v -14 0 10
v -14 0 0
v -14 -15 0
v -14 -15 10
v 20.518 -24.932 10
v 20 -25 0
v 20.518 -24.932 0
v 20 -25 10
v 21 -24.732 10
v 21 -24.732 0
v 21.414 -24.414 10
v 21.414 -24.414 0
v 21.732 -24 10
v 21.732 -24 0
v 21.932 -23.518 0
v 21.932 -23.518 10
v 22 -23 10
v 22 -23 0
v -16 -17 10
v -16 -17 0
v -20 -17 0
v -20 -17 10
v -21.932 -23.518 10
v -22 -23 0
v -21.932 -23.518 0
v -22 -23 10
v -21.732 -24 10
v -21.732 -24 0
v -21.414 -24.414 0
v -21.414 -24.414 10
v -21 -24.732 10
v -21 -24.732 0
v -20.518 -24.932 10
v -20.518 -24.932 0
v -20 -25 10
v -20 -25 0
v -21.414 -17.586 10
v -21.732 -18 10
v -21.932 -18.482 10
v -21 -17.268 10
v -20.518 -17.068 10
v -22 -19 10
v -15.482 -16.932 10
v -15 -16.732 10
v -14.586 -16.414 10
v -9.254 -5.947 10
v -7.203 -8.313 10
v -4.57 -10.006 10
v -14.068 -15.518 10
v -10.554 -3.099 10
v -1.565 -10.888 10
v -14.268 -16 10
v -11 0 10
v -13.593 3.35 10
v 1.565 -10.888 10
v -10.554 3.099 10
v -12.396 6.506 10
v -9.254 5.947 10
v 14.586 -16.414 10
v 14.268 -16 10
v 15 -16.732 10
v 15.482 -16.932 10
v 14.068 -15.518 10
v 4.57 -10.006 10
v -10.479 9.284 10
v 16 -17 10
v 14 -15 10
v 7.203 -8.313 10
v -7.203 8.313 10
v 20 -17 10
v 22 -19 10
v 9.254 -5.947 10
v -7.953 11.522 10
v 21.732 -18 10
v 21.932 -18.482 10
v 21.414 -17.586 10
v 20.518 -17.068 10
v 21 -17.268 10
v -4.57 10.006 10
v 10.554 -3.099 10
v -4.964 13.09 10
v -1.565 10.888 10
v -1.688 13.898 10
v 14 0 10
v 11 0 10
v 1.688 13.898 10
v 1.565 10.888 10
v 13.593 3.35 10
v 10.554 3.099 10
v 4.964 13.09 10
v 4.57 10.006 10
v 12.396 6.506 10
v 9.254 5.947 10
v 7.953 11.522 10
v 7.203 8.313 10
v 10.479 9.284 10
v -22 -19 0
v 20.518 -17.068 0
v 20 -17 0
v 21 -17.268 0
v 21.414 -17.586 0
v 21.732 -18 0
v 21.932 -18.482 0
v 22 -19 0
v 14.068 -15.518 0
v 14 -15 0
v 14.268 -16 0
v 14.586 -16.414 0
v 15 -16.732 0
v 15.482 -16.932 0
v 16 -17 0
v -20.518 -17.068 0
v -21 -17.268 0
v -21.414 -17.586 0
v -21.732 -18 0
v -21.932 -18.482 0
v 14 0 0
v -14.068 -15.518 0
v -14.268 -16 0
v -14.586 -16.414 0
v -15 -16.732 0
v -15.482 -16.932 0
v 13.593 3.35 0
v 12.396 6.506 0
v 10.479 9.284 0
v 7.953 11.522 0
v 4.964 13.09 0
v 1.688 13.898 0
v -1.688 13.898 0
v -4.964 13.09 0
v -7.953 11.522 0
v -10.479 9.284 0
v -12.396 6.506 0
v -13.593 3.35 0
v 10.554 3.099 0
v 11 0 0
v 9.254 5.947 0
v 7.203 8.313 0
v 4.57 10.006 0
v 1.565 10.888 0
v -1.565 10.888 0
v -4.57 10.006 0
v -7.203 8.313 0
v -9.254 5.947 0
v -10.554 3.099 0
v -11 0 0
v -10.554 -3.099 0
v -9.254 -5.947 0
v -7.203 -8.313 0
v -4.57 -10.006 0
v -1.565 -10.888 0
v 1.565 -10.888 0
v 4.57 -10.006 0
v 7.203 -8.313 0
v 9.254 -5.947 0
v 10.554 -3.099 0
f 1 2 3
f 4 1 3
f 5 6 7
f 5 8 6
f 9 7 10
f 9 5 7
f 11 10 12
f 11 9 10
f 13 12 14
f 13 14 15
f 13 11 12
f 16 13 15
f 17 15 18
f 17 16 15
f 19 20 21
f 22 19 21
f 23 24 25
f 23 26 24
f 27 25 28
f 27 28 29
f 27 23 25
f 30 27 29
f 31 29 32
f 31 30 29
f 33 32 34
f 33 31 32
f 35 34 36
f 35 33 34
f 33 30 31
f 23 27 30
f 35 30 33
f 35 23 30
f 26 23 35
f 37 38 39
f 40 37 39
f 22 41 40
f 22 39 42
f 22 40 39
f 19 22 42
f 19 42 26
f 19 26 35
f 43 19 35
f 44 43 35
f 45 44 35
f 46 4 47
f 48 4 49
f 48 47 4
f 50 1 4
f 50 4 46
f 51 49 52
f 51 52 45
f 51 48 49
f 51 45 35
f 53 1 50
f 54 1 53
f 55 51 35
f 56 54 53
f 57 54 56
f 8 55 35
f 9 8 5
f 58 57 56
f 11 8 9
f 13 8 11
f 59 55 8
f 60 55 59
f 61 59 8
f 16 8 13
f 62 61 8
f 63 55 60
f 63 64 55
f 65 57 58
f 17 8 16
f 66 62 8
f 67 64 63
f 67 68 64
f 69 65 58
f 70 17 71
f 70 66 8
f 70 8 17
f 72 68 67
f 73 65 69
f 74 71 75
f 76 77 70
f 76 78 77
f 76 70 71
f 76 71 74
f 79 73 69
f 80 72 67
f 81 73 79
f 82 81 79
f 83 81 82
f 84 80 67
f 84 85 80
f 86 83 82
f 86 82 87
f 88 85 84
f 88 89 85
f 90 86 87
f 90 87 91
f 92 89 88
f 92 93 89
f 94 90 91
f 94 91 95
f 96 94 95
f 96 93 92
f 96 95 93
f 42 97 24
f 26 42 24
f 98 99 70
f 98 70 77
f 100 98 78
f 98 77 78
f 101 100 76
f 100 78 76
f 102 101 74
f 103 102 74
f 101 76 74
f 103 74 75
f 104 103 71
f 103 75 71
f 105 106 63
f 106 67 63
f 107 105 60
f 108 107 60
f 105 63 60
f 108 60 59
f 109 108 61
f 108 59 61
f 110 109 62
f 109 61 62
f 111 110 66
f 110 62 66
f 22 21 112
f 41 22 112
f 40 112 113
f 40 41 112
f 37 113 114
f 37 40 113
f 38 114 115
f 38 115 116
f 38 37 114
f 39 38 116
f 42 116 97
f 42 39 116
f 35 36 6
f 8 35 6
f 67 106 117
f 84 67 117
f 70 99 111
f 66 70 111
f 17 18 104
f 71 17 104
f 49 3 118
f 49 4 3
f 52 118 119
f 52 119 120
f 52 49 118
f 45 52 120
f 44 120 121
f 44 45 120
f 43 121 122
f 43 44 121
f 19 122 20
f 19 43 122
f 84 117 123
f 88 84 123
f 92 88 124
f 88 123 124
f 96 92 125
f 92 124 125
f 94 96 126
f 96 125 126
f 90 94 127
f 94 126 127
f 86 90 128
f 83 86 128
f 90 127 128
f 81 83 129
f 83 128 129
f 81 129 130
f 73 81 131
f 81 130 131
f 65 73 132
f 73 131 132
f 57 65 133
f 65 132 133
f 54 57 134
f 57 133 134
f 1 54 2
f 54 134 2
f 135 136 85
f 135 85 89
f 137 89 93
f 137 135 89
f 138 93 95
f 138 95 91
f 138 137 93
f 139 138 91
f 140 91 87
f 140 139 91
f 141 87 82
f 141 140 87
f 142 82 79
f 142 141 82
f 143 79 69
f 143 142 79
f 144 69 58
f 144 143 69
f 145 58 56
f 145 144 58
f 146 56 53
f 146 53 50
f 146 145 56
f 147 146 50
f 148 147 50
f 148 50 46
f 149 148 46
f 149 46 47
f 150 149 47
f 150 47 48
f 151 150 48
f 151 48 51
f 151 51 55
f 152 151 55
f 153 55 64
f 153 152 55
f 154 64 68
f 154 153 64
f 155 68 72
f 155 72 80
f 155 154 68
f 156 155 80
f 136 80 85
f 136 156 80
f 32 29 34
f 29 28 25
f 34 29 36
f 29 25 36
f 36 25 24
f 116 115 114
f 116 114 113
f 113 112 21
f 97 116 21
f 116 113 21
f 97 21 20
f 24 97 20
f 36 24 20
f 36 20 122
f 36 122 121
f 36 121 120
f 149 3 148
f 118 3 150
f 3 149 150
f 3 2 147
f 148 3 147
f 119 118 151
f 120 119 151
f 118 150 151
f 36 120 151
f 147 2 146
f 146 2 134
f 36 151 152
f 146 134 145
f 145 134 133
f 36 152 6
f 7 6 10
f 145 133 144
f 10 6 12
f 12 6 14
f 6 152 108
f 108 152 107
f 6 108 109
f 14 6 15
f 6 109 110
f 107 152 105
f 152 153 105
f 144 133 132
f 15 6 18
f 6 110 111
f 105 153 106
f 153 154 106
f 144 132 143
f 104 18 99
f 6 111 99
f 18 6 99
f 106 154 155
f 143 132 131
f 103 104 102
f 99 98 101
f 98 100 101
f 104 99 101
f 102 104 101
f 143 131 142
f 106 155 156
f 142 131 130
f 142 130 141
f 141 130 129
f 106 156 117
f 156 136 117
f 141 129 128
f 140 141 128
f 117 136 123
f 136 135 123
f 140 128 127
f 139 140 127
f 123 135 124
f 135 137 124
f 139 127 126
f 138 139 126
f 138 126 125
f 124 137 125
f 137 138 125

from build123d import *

# Parameters (mm, degrees)
SKETCH1_R           = 14
SKETCH1_R_2         = 11
BOSS_EXTRUDE1_DEPTH = 10
FILLET1_R           = 2


with BuildPart() as part:
    # Sketch1 → Boss-Extrude1 (new body)
    # profile 1 of 2: a face of its own
    with BuildSketch(Plane.XY):
        with BuildLine():
            ThreePointArc((14, 0), (0, -14), (-14, 0))
            Line((-14, 0), (-14, -17))
            Line((-14, -17), (-22, -17))
            Line((-22, -17), (-22, -25))
            Line((-22, -25), (22, -25))
            Line((22, -25), (22, -17))
            Line((22, -17), (14, -17))
            Line((14, -17), (14, 0))
        make_face()
    # profile 2 of 2: a face of its own
    with BuildSketch(Plane.XY):
        Circle(SKETCH1_R)
        Circle(SKETCH1_R_2, mode=Mode.SUBTRACT)
    extrude(amount=BOSS_EXTRUDE1_DEPTH)

    # Fillet1
    fillet1_edges = [part.edges().sort_by_distance(p)[0] for p in [
        (14, -17, 5),
        (22, -17, 5),
        (22, -25, 5),
        (-22, -25, 5),
        (-22, -17, 5),
        (-14, -17, 5),
    ]]
    fillet(fillet1_edges, radius=FILLET1_R)


solid = part.part
